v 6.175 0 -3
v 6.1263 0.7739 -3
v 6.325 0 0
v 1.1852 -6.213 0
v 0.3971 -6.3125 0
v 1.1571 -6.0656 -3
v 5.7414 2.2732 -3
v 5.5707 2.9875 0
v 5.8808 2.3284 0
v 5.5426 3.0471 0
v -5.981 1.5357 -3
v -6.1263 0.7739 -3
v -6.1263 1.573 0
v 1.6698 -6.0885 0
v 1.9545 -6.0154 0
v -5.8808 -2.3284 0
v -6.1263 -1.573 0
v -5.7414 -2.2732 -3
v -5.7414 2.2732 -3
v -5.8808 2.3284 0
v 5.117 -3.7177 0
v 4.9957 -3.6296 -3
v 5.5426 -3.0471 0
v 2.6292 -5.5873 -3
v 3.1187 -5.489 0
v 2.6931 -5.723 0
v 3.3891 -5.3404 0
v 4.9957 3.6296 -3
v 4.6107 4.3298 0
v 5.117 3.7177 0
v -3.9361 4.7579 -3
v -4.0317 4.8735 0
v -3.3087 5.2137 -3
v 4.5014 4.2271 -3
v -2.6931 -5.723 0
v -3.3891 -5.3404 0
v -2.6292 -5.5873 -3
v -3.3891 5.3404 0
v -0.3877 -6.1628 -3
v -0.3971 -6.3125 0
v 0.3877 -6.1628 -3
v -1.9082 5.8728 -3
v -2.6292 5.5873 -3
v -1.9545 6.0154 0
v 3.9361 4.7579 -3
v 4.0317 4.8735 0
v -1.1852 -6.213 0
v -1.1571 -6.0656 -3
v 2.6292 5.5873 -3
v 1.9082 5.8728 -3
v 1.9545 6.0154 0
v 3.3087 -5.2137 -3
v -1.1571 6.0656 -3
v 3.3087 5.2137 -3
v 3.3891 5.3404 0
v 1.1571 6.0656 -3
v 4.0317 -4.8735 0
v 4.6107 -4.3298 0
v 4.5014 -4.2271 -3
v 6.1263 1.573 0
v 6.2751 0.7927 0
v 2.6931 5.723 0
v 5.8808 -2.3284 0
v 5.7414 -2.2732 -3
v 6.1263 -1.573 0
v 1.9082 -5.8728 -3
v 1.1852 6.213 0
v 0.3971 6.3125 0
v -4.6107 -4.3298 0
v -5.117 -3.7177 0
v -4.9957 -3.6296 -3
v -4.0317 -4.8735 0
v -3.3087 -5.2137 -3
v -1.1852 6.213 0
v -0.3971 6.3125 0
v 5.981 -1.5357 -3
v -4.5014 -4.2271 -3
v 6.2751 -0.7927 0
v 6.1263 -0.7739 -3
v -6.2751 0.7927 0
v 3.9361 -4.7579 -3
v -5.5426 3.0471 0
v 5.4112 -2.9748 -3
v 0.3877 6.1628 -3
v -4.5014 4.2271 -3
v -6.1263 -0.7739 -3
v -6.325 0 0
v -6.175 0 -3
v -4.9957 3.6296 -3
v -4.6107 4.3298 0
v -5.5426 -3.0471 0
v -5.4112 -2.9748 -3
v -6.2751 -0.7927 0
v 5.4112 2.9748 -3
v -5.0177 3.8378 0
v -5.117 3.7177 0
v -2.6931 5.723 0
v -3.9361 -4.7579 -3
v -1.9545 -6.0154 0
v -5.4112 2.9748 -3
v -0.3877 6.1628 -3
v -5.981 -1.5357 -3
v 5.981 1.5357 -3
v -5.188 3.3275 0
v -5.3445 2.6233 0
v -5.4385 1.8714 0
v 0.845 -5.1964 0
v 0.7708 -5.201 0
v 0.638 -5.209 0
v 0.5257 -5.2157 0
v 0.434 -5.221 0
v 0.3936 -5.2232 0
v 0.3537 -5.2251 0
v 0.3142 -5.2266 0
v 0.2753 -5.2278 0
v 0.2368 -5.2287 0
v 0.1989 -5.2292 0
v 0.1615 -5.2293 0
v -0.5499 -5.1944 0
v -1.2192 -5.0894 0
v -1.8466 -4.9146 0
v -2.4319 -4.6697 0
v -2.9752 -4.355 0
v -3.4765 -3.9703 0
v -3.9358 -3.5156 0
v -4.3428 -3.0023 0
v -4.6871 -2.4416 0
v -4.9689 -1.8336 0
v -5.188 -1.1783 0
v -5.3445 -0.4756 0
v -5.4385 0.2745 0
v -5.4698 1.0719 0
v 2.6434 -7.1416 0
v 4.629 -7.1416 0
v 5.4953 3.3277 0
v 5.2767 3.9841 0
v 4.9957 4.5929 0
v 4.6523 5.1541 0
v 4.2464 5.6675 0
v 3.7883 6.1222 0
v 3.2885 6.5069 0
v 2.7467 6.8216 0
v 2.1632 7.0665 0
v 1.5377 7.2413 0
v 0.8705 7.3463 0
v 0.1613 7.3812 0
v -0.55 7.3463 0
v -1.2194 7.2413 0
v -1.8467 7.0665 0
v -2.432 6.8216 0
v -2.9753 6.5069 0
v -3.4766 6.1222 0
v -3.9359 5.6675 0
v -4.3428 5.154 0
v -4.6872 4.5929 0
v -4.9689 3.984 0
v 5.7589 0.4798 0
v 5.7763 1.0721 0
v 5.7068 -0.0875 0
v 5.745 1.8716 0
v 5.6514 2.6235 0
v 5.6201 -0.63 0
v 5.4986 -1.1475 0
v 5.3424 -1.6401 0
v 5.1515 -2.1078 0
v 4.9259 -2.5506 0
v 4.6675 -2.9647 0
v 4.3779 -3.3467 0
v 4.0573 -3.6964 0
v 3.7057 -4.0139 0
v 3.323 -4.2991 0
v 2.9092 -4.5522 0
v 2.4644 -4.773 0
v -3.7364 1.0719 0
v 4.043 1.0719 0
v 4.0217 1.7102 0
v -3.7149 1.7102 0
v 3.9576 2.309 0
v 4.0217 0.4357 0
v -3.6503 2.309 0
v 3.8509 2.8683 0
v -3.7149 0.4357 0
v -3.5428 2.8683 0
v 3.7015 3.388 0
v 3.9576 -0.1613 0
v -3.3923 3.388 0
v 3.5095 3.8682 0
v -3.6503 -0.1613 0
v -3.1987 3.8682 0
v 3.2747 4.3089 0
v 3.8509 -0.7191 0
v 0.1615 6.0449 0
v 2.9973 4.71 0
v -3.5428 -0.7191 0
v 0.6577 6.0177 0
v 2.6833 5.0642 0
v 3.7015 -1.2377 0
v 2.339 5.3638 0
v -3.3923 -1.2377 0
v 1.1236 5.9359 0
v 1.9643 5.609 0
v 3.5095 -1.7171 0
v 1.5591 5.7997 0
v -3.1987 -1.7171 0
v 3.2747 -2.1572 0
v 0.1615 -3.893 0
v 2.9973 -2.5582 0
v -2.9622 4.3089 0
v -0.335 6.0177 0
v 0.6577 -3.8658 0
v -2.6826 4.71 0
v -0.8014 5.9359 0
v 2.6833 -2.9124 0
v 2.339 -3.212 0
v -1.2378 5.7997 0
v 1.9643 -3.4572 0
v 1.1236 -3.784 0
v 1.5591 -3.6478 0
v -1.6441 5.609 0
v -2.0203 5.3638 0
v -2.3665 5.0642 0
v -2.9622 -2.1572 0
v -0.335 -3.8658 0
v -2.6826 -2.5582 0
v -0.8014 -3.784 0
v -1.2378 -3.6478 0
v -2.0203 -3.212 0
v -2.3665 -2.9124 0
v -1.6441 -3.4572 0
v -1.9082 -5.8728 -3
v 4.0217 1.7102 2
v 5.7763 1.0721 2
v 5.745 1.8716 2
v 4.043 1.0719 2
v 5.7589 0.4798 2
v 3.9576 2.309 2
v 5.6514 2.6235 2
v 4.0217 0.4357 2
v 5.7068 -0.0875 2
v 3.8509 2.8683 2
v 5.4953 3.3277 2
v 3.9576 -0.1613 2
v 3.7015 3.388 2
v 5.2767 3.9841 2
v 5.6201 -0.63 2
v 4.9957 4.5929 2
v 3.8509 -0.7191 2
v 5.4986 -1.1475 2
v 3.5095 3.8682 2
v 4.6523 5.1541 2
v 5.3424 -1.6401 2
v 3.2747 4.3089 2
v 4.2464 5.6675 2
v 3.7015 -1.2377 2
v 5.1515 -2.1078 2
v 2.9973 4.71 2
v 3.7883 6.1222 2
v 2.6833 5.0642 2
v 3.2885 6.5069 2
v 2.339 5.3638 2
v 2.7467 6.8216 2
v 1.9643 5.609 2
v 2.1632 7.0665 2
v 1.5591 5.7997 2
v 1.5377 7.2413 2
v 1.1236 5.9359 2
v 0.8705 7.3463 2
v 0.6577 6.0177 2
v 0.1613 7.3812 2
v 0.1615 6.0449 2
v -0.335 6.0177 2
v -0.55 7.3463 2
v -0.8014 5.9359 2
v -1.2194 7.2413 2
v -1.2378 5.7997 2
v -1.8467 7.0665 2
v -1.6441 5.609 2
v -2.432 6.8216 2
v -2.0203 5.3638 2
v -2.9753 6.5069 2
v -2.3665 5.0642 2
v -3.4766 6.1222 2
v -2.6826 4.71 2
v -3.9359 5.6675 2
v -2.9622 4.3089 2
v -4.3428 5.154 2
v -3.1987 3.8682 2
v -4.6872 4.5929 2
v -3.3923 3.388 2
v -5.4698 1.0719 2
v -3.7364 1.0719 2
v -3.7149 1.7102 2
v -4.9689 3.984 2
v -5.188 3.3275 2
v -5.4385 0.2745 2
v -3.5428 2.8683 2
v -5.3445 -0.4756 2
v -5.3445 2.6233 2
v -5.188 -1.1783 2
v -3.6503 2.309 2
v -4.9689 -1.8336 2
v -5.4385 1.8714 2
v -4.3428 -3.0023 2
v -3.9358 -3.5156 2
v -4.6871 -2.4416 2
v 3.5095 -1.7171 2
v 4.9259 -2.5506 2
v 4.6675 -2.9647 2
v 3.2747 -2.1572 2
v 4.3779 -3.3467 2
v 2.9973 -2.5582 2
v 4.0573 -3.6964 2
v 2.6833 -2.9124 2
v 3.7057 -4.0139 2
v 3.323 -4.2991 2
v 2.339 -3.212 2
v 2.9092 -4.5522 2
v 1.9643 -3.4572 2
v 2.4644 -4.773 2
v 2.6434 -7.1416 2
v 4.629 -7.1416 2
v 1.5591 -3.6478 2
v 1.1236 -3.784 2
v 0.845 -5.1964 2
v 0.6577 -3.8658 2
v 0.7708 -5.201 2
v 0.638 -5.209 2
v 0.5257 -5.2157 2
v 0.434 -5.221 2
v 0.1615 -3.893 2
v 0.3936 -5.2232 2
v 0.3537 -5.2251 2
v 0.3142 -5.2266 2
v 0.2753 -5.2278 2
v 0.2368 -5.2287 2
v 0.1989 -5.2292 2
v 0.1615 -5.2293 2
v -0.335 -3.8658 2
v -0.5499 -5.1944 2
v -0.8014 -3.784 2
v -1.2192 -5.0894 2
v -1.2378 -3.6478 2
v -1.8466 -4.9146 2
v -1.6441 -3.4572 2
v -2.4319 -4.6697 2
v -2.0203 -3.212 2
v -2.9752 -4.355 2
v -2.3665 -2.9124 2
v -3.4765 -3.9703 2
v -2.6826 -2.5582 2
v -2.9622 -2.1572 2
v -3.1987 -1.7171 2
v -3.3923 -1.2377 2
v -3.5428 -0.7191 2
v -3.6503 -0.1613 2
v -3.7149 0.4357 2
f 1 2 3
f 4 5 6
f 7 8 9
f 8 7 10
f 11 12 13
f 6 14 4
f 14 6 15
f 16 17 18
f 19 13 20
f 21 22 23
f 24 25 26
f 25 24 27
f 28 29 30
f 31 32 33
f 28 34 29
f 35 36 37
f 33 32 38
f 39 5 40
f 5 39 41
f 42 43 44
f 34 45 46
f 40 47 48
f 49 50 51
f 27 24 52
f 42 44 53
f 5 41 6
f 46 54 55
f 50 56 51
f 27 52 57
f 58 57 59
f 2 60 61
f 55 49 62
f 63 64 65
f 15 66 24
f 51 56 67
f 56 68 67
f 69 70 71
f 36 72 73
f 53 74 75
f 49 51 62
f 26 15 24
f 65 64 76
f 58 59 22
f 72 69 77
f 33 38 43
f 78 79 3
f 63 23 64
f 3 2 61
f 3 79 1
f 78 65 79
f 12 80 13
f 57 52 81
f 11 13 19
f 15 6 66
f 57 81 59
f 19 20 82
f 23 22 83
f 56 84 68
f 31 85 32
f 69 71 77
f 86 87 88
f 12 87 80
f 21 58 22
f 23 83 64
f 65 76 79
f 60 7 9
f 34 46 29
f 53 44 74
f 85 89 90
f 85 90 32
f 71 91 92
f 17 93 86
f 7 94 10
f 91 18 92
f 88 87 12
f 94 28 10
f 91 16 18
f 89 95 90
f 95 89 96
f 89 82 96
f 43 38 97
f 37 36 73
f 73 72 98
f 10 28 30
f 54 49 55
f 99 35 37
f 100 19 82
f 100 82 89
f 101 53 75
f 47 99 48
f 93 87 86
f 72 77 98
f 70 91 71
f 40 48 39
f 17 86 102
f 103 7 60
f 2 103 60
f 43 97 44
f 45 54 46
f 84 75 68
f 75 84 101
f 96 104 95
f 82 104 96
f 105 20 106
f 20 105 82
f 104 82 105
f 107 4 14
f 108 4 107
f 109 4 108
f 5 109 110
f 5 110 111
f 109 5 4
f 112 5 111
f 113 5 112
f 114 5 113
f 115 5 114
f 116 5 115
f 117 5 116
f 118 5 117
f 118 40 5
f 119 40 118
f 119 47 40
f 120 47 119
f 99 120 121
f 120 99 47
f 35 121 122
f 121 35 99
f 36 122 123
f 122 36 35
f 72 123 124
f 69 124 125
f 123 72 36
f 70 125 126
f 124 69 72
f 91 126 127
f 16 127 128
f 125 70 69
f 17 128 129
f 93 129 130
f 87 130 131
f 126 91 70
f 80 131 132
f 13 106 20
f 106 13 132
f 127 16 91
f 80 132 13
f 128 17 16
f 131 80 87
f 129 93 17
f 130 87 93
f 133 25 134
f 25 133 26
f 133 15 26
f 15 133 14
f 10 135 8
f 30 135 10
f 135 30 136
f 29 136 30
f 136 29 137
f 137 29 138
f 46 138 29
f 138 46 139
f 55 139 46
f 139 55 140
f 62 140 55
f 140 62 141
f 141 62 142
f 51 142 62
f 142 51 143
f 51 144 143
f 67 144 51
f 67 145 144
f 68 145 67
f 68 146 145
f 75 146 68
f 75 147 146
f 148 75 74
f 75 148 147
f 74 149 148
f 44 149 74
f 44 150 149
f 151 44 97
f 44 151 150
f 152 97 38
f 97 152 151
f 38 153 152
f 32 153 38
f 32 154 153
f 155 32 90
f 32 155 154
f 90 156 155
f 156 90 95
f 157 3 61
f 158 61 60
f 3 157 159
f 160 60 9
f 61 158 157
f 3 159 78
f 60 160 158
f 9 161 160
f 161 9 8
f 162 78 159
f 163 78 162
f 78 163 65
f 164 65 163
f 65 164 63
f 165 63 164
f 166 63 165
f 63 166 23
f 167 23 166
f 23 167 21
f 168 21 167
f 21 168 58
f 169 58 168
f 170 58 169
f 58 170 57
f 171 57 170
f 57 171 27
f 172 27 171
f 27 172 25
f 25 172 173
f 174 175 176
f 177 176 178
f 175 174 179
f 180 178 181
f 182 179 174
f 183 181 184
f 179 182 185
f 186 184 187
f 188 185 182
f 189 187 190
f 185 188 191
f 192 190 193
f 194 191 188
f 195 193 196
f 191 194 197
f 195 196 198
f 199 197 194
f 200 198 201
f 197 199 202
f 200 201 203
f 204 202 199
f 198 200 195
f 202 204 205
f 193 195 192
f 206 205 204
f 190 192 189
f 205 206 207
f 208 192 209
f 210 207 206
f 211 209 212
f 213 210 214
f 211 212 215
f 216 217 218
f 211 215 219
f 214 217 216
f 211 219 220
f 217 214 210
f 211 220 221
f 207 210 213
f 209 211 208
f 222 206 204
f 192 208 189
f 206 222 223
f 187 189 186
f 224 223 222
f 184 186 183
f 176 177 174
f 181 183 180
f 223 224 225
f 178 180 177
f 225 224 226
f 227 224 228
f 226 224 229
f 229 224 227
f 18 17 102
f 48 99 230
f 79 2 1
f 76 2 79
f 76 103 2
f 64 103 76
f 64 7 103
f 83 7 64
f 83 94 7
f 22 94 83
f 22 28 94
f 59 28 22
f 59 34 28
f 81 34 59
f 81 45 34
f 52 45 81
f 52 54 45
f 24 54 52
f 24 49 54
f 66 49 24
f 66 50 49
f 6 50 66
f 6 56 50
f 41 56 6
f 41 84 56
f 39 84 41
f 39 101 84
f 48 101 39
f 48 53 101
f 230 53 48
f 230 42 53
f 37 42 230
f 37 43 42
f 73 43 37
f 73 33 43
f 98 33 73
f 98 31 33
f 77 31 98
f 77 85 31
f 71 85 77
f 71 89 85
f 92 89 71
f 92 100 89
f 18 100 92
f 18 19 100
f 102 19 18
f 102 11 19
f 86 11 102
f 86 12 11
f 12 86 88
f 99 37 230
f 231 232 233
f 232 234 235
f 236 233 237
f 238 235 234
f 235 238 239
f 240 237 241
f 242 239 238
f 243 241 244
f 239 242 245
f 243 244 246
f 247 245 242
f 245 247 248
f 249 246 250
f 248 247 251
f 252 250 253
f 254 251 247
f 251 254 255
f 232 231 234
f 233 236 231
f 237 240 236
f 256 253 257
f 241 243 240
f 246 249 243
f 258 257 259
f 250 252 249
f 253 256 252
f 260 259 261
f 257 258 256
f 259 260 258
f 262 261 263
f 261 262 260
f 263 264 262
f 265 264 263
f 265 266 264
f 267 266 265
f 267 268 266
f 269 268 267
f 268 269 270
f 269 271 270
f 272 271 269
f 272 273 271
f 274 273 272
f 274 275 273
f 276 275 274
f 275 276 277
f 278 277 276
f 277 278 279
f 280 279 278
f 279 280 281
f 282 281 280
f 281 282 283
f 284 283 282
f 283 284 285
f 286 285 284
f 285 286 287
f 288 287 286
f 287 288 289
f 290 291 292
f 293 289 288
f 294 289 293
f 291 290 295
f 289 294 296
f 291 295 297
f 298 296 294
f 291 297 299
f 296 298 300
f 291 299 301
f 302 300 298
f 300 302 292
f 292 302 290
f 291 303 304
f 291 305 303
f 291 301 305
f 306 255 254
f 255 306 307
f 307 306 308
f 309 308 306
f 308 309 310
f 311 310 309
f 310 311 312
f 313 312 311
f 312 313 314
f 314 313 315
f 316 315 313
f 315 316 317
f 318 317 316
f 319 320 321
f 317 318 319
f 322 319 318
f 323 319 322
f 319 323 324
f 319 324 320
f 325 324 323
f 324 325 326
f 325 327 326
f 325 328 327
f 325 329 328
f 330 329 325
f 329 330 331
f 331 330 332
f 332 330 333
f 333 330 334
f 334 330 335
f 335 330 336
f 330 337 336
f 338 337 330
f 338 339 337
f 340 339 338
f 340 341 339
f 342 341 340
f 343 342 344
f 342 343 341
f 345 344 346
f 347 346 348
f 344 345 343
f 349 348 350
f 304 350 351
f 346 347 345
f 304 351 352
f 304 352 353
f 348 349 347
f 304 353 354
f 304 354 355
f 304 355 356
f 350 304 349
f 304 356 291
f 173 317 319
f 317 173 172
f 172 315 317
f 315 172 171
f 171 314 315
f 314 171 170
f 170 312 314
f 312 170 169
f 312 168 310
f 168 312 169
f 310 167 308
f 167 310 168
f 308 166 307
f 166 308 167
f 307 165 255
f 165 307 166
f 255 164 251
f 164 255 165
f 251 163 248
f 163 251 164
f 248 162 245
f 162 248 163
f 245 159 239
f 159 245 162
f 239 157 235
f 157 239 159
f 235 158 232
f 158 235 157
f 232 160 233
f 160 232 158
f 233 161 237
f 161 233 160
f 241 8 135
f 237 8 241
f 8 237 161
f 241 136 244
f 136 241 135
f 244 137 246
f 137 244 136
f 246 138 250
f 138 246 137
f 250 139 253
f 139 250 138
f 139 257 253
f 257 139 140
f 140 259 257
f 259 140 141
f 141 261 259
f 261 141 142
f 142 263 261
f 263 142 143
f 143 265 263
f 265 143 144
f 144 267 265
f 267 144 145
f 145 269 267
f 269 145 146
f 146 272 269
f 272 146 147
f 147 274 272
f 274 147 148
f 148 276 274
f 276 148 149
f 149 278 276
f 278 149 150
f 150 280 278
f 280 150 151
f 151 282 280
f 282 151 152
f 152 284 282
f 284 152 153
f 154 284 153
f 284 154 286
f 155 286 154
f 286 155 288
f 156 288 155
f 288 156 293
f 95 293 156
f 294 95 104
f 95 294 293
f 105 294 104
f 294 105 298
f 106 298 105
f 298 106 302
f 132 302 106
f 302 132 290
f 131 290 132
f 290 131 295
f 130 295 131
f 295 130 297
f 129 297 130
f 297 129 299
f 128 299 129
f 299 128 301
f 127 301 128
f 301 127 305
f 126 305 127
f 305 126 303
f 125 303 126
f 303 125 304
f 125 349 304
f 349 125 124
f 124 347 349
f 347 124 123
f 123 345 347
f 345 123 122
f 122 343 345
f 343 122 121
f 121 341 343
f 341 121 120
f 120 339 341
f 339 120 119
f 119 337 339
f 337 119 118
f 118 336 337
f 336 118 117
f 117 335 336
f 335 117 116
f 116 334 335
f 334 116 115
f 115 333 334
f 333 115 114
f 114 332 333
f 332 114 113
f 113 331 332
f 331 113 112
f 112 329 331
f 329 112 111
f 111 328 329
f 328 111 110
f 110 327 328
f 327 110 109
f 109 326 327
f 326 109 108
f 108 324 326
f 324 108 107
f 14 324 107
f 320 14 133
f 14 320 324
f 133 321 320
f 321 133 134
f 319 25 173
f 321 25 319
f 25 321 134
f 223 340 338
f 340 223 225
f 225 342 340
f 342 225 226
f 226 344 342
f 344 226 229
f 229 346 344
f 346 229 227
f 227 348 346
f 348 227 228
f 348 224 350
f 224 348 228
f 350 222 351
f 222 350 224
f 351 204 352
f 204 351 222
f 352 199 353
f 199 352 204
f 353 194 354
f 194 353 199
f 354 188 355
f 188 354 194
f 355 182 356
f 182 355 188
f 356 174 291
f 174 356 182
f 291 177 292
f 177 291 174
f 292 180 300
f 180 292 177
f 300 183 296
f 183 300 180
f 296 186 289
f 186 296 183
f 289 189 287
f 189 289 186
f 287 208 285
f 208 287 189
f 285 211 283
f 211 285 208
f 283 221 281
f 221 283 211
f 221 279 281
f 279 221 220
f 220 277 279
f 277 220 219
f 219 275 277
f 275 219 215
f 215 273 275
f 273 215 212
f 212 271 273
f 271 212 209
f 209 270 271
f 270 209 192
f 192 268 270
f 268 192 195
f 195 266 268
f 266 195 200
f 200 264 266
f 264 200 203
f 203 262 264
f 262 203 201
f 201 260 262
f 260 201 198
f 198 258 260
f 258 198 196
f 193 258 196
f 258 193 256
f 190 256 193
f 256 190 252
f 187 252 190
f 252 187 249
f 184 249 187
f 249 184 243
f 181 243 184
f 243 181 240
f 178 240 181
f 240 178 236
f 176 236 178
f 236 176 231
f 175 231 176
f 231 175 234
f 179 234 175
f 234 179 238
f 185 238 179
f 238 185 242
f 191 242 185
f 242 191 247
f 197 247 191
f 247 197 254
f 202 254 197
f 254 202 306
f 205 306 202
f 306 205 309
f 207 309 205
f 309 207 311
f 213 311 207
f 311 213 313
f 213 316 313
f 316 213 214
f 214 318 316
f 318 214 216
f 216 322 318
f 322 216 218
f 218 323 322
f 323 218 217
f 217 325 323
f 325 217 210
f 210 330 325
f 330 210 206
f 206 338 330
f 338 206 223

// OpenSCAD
$fn = 50;

difference() {
	union() {
		translate(v = [0, 0, -3.0]) {
			cylinder(h = 3, r1 = 6.175, r2 = 6.325);
		}
		linear_extrude(height = 2) {
			text(font = "Impact", halign = "center", size = 12, text = "Q", valign = "center");
		}
	}
	union();
}
